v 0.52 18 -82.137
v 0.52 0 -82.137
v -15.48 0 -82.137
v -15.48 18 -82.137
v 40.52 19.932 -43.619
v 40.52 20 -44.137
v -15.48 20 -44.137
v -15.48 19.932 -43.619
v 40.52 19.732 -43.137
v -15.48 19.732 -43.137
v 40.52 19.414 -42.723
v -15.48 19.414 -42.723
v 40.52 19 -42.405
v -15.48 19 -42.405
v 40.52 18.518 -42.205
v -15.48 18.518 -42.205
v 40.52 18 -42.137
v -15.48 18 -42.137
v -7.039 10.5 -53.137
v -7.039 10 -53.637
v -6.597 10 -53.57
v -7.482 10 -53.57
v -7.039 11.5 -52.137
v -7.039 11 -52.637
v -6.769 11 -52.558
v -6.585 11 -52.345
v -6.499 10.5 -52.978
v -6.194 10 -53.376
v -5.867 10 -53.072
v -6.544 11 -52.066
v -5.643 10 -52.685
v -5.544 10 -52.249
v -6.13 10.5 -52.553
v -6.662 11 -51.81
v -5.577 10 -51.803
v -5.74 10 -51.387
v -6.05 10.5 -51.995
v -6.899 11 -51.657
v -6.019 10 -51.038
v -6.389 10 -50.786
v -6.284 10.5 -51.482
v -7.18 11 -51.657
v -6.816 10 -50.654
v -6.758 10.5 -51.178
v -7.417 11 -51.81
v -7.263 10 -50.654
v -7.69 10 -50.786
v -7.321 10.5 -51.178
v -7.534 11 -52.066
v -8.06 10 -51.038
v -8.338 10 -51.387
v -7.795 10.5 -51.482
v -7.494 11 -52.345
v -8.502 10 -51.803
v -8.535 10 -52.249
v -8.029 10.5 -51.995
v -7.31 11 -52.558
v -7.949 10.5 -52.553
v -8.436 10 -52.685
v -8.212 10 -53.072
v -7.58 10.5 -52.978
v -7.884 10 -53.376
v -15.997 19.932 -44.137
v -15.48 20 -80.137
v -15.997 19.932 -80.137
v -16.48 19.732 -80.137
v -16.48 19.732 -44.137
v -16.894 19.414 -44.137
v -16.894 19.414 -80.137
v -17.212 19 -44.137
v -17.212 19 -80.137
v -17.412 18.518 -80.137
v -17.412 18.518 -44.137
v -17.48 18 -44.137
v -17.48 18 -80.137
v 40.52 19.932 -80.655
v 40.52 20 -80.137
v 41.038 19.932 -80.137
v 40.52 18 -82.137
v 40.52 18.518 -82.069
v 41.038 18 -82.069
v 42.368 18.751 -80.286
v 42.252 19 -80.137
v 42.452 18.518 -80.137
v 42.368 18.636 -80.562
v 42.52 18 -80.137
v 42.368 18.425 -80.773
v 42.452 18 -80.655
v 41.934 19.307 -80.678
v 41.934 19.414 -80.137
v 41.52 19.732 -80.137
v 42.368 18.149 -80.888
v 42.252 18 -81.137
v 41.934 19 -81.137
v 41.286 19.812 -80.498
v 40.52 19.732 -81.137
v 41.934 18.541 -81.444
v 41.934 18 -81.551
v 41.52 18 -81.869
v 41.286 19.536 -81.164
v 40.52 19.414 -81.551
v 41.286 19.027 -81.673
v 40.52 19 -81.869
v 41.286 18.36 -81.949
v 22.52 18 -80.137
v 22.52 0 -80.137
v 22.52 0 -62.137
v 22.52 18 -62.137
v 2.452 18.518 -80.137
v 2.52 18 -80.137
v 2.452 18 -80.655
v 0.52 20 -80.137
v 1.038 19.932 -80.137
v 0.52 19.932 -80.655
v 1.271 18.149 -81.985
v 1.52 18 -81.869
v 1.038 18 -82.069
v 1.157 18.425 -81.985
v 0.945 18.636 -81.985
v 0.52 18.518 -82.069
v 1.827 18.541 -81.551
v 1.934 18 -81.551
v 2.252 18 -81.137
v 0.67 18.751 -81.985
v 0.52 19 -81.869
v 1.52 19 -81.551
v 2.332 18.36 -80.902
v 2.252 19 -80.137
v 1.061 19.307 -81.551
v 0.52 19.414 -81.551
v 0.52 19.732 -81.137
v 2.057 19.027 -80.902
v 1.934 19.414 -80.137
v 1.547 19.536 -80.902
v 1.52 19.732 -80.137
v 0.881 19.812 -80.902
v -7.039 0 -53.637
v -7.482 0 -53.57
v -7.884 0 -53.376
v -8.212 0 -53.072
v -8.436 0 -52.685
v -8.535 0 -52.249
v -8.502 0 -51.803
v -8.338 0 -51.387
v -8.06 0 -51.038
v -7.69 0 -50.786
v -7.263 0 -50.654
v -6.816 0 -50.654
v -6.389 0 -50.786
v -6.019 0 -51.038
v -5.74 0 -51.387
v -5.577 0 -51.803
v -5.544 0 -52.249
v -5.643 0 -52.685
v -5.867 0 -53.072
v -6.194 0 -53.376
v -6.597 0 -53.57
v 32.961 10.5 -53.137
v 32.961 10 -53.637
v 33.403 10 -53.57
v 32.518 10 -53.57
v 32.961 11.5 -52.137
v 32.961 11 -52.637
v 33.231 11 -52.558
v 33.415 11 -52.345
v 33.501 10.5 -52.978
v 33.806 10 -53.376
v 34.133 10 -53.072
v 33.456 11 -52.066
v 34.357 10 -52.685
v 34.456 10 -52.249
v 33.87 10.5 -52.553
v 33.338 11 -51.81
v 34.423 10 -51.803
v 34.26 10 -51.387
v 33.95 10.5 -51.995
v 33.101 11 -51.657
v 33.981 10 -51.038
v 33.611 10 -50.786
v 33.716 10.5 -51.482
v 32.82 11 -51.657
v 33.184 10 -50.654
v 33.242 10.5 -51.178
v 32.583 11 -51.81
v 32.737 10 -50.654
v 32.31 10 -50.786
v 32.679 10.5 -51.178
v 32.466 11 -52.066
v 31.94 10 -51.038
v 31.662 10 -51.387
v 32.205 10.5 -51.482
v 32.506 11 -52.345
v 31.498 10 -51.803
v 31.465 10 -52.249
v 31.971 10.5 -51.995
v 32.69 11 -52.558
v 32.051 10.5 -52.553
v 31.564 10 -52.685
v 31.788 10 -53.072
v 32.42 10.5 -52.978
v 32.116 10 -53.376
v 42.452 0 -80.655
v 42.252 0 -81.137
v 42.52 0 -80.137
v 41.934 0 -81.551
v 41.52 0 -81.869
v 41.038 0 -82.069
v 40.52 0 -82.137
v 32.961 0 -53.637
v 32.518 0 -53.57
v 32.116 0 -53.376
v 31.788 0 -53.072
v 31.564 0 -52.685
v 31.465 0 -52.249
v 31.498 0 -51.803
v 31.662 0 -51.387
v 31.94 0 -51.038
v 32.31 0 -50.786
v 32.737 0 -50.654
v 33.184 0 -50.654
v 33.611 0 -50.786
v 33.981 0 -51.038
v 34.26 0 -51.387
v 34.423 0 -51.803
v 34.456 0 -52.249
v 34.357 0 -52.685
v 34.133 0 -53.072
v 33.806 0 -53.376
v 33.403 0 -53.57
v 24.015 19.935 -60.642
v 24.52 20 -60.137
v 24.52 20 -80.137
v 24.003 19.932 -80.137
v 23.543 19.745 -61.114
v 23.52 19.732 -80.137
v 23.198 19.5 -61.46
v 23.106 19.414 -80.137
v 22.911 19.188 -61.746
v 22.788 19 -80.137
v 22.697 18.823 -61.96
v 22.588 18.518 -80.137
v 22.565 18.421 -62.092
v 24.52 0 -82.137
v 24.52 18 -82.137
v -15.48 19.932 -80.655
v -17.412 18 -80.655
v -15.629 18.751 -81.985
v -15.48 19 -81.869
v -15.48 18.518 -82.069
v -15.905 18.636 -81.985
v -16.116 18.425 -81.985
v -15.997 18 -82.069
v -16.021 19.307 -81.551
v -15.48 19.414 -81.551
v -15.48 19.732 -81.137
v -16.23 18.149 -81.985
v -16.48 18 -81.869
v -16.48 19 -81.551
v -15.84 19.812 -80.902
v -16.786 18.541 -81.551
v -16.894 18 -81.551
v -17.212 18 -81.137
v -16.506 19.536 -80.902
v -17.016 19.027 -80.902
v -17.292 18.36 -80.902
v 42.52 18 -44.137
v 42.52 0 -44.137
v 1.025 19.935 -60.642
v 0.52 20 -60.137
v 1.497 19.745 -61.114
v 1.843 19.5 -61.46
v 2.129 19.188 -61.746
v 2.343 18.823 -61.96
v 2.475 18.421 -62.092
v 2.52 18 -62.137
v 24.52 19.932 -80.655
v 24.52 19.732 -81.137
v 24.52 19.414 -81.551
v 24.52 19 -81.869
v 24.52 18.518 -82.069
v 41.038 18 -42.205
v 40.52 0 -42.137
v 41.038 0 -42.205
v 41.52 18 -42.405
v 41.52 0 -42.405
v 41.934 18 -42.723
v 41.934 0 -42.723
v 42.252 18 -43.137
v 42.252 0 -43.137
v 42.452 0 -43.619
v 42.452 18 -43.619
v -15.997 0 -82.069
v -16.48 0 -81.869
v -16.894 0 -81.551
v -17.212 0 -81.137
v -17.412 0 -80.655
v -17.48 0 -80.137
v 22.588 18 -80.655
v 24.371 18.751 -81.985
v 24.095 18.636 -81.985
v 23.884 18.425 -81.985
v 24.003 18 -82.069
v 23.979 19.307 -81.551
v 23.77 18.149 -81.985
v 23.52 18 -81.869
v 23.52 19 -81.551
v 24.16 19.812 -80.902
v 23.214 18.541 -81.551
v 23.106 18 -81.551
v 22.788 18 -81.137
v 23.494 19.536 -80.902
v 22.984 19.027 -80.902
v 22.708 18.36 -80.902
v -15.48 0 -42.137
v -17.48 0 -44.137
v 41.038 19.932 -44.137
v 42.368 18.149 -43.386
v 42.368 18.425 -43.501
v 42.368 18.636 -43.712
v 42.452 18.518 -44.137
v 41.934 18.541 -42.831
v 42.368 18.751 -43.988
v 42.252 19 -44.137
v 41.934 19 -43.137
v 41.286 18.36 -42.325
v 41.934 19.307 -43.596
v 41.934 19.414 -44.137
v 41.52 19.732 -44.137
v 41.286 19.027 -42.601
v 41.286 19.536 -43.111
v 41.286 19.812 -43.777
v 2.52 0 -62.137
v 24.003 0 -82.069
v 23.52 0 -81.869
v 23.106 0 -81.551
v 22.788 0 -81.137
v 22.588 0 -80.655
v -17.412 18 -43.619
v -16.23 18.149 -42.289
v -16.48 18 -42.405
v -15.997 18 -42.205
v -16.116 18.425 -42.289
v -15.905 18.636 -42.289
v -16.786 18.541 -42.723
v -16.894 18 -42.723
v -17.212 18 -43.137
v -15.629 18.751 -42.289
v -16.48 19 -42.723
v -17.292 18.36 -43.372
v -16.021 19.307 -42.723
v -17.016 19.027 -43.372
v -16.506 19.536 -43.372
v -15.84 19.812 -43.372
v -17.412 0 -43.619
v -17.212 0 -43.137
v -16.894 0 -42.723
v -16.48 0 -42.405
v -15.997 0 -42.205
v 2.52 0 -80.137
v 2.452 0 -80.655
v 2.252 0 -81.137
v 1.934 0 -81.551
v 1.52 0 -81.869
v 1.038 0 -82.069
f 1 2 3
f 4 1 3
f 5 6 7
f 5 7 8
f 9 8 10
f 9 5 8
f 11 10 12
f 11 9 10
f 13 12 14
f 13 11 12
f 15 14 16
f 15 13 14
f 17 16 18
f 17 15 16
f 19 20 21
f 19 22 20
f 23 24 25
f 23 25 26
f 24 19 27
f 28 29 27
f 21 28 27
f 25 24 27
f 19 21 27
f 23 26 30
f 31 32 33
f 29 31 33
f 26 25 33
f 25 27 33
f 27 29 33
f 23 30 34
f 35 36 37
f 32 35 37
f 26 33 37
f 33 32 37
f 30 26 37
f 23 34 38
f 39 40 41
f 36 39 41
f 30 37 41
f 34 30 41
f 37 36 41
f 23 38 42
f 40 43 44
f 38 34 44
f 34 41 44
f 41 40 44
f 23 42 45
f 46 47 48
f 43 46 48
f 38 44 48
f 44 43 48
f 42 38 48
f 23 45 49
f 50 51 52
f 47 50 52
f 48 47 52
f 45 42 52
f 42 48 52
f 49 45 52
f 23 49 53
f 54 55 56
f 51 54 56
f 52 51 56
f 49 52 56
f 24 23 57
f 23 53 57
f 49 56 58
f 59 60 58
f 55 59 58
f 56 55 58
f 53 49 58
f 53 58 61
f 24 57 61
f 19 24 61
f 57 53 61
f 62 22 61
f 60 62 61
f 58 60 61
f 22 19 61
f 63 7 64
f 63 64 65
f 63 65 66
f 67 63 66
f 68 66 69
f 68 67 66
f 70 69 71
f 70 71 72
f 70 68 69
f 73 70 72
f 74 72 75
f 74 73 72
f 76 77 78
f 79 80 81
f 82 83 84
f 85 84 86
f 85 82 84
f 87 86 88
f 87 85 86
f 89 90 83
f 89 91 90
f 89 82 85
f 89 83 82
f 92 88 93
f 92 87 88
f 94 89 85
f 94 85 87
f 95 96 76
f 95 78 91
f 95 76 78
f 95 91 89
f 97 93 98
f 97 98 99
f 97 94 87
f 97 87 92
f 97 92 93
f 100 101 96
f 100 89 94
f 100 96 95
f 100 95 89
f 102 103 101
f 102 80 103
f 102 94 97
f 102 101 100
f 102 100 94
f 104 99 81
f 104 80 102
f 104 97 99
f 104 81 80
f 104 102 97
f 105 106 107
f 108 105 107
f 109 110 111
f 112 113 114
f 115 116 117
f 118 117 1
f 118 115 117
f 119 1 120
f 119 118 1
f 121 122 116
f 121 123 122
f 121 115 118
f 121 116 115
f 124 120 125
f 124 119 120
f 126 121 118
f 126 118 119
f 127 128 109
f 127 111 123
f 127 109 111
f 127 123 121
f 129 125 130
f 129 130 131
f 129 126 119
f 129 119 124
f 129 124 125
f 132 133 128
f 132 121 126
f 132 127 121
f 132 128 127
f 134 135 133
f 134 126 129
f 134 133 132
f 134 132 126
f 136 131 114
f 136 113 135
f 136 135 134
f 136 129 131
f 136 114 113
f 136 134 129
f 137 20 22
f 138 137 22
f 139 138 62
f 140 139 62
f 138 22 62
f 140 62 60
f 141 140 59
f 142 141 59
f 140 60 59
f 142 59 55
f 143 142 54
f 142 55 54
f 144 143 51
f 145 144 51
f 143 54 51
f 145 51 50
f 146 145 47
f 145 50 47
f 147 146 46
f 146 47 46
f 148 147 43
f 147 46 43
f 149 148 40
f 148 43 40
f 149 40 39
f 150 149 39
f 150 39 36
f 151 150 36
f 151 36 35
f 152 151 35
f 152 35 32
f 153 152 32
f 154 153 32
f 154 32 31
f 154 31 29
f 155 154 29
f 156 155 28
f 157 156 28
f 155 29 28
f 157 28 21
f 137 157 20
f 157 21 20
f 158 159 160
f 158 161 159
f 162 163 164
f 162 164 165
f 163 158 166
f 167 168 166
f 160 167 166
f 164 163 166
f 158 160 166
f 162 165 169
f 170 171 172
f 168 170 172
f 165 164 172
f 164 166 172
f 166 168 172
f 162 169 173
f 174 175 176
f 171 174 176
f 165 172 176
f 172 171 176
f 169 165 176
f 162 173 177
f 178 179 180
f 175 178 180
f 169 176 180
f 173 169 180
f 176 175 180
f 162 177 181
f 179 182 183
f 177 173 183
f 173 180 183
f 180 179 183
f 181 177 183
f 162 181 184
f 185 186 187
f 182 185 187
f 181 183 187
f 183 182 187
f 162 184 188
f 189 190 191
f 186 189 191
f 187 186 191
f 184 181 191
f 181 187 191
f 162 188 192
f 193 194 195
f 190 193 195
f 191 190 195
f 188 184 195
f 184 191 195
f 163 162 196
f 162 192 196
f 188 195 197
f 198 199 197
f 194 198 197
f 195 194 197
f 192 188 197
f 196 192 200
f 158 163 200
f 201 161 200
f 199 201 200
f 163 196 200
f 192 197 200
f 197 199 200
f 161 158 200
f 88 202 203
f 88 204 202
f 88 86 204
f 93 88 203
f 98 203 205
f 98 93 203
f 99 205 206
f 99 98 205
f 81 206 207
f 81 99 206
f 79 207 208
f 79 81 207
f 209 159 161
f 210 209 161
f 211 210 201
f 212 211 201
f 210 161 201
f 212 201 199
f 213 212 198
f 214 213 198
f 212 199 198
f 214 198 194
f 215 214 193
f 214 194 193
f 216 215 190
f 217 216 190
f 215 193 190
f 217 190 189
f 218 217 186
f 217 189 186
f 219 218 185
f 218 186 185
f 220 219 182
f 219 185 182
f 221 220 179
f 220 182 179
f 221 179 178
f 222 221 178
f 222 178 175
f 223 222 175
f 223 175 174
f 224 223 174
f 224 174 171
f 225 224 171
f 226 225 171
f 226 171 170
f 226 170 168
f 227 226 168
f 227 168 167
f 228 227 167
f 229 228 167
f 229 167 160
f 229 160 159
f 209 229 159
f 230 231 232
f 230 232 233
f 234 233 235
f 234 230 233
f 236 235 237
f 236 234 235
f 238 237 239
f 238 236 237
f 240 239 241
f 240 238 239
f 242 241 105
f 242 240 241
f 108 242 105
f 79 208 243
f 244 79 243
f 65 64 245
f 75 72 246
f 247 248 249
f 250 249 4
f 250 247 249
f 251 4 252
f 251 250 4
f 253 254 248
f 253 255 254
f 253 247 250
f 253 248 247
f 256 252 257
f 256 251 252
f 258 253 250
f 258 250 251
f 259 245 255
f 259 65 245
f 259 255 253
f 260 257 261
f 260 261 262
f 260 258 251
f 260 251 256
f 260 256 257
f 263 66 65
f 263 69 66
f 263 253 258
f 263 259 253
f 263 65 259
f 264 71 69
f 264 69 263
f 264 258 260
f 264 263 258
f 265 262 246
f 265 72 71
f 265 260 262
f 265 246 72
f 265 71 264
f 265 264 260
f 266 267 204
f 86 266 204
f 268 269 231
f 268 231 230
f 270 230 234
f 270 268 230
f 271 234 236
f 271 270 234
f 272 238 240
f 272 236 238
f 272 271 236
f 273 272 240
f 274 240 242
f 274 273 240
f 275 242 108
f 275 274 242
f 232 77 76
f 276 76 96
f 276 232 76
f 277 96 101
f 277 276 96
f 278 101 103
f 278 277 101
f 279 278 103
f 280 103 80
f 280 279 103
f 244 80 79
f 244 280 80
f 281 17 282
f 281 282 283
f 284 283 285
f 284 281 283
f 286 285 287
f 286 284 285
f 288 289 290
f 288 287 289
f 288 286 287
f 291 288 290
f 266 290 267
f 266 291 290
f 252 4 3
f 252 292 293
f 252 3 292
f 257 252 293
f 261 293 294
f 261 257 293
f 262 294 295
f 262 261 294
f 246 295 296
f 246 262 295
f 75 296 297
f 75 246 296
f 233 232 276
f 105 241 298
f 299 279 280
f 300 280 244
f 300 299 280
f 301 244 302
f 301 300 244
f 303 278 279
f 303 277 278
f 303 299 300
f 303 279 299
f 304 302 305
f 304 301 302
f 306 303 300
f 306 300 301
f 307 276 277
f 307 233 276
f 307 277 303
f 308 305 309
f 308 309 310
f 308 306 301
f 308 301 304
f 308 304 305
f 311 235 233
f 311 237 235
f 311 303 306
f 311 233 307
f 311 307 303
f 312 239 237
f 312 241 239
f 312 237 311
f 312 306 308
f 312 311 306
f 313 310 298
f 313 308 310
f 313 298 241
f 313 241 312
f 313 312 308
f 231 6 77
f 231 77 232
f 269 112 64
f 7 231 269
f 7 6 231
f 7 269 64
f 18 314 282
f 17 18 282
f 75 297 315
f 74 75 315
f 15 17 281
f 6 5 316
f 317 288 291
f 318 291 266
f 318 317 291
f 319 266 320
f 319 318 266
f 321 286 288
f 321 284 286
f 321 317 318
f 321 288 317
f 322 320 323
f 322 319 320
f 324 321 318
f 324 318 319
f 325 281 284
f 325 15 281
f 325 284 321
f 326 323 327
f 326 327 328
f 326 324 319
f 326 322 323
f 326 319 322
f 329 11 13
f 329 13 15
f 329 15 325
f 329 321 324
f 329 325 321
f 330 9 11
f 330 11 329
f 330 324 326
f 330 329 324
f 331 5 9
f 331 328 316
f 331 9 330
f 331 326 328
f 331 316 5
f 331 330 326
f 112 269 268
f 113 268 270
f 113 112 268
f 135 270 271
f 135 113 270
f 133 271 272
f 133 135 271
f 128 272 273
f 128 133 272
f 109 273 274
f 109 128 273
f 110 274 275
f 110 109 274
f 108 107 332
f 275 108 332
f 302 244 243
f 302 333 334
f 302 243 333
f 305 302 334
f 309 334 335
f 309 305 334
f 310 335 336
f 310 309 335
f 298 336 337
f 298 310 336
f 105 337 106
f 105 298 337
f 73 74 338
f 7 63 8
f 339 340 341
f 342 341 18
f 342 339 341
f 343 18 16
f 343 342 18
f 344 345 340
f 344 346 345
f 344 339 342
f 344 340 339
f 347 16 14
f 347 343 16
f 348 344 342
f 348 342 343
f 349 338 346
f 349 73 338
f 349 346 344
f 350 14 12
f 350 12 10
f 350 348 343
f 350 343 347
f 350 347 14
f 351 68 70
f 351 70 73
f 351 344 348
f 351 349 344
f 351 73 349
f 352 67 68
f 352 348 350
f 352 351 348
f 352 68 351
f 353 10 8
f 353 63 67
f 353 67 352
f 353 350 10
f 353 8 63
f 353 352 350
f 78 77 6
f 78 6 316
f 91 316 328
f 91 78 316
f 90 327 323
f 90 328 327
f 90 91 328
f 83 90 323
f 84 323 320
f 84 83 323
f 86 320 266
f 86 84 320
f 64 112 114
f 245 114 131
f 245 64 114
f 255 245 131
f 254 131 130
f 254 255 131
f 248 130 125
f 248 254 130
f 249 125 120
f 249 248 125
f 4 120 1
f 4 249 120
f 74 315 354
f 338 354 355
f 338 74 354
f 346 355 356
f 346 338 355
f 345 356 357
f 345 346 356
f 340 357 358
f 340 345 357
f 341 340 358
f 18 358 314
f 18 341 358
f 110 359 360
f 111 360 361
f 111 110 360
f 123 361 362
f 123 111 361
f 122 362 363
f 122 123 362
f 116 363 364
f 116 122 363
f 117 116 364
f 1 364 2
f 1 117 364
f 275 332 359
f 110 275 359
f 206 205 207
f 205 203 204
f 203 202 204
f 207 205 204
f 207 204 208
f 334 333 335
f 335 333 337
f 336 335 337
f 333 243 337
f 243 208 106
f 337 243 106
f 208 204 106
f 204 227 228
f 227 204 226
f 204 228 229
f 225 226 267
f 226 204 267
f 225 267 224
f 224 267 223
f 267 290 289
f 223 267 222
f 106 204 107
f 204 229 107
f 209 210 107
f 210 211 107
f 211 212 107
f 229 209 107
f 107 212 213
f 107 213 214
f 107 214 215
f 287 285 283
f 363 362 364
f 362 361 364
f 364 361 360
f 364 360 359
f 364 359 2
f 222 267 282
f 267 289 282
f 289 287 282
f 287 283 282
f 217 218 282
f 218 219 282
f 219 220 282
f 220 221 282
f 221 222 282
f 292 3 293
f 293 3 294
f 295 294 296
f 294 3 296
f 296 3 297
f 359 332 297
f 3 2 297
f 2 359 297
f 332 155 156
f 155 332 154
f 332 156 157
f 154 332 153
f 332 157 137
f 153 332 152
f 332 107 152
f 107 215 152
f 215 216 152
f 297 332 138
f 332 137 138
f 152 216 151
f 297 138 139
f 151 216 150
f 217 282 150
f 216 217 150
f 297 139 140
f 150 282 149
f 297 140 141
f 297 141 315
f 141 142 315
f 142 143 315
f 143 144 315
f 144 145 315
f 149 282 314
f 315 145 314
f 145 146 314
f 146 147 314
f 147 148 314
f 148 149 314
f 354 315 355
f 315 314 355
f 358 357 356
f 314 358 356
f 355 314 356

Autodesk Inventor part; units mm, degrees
ref_plane "YZ Plane" through (0, 0, 0) normal (1, 0, 0) x (0, 1, 0)
ref_plane "XZ Plane" through (0, 0, 0) normal (0, 1, 0) x (-1, 0, 0)
ref_plane "XY Plane" through (0, 0, 0) normal (0, 0, 1) x (1, 0, 0)
sketch "Эскиз1" plane through (0, 0, 0) normal (0, 1, 0) x (-1, 0, 0)
  line L0 (17.4798, -42.1371) -> (-42.5202, -42.1371)
  line L1 (-42.5202, -42.1371) -> (-42.5202, -82.1371)
  line L2 (-42.5202, -82.1371) -> (-22.5202, -82.1371)
  line L3 (-22.5202, -82.1371) -> (-22.5202, -62.1371)
  line L4 (-22.5202, -62.1371) -> (-2.5202, -62.1371)
  line L5 (-2.5202, -62.1371) -> (-2.5202, -82.1371)
  line L6 (-2.5202, -82.1371) -> (17.4798, -82.1371)
  line L7 (17.4798, -82.1371) -> (17.4798, -42.1371)
  point P0 (0, 0)
  dimension "d1" = 40
  dimension "d3" = 20
  dimension "d4" = 20
  dimension "d5" = 20
extrude "Выдавливание1" add sketch "Эскиз1" along normal blind 20
fillet "Сопряжение1" radius 2 14 edges at (-17.4798, 20, -62.1371) (12.5202, 20, -42.1371) (2.5202, 20, -72.1371) (12.5202, 20, -62.1371) (-7.4798, 20, -82.1371) (22.5202, 20, -72.1371) (32.5202, 20, -82.1371) (42.5202, 20, -62.1371) (42.5202, 10, -82.1371) (2.5202, 10, -82.1371) (22.5202, 10, -82.1371) (-17.4798, 10, -82.1371) (-17.4798, 10, -42.1371) (42.5202, 10, -42.1371)
sketch "Эскиз2" plane through (0, 0, 0) normal (0, -1, 0) x (1, 0, 0)
  line L0 (-15.4798, -42.1371) -> (40.5202, -42.1371) projected
  point P0 (0, 0)
  point P1 (32.9606, -52.1371)
  point P2 (-7.0394, -52.1371)
  dimension "d9" = 40
  dimension "d10" = 10
hole "Отверстие1" at (32.9606, 0, -52.1371) at (-7.0394, 0, -52.1371) direction (0, 1, 0) diameter 3 depth 10 tip angle 90
properties part number "stand_stop"
